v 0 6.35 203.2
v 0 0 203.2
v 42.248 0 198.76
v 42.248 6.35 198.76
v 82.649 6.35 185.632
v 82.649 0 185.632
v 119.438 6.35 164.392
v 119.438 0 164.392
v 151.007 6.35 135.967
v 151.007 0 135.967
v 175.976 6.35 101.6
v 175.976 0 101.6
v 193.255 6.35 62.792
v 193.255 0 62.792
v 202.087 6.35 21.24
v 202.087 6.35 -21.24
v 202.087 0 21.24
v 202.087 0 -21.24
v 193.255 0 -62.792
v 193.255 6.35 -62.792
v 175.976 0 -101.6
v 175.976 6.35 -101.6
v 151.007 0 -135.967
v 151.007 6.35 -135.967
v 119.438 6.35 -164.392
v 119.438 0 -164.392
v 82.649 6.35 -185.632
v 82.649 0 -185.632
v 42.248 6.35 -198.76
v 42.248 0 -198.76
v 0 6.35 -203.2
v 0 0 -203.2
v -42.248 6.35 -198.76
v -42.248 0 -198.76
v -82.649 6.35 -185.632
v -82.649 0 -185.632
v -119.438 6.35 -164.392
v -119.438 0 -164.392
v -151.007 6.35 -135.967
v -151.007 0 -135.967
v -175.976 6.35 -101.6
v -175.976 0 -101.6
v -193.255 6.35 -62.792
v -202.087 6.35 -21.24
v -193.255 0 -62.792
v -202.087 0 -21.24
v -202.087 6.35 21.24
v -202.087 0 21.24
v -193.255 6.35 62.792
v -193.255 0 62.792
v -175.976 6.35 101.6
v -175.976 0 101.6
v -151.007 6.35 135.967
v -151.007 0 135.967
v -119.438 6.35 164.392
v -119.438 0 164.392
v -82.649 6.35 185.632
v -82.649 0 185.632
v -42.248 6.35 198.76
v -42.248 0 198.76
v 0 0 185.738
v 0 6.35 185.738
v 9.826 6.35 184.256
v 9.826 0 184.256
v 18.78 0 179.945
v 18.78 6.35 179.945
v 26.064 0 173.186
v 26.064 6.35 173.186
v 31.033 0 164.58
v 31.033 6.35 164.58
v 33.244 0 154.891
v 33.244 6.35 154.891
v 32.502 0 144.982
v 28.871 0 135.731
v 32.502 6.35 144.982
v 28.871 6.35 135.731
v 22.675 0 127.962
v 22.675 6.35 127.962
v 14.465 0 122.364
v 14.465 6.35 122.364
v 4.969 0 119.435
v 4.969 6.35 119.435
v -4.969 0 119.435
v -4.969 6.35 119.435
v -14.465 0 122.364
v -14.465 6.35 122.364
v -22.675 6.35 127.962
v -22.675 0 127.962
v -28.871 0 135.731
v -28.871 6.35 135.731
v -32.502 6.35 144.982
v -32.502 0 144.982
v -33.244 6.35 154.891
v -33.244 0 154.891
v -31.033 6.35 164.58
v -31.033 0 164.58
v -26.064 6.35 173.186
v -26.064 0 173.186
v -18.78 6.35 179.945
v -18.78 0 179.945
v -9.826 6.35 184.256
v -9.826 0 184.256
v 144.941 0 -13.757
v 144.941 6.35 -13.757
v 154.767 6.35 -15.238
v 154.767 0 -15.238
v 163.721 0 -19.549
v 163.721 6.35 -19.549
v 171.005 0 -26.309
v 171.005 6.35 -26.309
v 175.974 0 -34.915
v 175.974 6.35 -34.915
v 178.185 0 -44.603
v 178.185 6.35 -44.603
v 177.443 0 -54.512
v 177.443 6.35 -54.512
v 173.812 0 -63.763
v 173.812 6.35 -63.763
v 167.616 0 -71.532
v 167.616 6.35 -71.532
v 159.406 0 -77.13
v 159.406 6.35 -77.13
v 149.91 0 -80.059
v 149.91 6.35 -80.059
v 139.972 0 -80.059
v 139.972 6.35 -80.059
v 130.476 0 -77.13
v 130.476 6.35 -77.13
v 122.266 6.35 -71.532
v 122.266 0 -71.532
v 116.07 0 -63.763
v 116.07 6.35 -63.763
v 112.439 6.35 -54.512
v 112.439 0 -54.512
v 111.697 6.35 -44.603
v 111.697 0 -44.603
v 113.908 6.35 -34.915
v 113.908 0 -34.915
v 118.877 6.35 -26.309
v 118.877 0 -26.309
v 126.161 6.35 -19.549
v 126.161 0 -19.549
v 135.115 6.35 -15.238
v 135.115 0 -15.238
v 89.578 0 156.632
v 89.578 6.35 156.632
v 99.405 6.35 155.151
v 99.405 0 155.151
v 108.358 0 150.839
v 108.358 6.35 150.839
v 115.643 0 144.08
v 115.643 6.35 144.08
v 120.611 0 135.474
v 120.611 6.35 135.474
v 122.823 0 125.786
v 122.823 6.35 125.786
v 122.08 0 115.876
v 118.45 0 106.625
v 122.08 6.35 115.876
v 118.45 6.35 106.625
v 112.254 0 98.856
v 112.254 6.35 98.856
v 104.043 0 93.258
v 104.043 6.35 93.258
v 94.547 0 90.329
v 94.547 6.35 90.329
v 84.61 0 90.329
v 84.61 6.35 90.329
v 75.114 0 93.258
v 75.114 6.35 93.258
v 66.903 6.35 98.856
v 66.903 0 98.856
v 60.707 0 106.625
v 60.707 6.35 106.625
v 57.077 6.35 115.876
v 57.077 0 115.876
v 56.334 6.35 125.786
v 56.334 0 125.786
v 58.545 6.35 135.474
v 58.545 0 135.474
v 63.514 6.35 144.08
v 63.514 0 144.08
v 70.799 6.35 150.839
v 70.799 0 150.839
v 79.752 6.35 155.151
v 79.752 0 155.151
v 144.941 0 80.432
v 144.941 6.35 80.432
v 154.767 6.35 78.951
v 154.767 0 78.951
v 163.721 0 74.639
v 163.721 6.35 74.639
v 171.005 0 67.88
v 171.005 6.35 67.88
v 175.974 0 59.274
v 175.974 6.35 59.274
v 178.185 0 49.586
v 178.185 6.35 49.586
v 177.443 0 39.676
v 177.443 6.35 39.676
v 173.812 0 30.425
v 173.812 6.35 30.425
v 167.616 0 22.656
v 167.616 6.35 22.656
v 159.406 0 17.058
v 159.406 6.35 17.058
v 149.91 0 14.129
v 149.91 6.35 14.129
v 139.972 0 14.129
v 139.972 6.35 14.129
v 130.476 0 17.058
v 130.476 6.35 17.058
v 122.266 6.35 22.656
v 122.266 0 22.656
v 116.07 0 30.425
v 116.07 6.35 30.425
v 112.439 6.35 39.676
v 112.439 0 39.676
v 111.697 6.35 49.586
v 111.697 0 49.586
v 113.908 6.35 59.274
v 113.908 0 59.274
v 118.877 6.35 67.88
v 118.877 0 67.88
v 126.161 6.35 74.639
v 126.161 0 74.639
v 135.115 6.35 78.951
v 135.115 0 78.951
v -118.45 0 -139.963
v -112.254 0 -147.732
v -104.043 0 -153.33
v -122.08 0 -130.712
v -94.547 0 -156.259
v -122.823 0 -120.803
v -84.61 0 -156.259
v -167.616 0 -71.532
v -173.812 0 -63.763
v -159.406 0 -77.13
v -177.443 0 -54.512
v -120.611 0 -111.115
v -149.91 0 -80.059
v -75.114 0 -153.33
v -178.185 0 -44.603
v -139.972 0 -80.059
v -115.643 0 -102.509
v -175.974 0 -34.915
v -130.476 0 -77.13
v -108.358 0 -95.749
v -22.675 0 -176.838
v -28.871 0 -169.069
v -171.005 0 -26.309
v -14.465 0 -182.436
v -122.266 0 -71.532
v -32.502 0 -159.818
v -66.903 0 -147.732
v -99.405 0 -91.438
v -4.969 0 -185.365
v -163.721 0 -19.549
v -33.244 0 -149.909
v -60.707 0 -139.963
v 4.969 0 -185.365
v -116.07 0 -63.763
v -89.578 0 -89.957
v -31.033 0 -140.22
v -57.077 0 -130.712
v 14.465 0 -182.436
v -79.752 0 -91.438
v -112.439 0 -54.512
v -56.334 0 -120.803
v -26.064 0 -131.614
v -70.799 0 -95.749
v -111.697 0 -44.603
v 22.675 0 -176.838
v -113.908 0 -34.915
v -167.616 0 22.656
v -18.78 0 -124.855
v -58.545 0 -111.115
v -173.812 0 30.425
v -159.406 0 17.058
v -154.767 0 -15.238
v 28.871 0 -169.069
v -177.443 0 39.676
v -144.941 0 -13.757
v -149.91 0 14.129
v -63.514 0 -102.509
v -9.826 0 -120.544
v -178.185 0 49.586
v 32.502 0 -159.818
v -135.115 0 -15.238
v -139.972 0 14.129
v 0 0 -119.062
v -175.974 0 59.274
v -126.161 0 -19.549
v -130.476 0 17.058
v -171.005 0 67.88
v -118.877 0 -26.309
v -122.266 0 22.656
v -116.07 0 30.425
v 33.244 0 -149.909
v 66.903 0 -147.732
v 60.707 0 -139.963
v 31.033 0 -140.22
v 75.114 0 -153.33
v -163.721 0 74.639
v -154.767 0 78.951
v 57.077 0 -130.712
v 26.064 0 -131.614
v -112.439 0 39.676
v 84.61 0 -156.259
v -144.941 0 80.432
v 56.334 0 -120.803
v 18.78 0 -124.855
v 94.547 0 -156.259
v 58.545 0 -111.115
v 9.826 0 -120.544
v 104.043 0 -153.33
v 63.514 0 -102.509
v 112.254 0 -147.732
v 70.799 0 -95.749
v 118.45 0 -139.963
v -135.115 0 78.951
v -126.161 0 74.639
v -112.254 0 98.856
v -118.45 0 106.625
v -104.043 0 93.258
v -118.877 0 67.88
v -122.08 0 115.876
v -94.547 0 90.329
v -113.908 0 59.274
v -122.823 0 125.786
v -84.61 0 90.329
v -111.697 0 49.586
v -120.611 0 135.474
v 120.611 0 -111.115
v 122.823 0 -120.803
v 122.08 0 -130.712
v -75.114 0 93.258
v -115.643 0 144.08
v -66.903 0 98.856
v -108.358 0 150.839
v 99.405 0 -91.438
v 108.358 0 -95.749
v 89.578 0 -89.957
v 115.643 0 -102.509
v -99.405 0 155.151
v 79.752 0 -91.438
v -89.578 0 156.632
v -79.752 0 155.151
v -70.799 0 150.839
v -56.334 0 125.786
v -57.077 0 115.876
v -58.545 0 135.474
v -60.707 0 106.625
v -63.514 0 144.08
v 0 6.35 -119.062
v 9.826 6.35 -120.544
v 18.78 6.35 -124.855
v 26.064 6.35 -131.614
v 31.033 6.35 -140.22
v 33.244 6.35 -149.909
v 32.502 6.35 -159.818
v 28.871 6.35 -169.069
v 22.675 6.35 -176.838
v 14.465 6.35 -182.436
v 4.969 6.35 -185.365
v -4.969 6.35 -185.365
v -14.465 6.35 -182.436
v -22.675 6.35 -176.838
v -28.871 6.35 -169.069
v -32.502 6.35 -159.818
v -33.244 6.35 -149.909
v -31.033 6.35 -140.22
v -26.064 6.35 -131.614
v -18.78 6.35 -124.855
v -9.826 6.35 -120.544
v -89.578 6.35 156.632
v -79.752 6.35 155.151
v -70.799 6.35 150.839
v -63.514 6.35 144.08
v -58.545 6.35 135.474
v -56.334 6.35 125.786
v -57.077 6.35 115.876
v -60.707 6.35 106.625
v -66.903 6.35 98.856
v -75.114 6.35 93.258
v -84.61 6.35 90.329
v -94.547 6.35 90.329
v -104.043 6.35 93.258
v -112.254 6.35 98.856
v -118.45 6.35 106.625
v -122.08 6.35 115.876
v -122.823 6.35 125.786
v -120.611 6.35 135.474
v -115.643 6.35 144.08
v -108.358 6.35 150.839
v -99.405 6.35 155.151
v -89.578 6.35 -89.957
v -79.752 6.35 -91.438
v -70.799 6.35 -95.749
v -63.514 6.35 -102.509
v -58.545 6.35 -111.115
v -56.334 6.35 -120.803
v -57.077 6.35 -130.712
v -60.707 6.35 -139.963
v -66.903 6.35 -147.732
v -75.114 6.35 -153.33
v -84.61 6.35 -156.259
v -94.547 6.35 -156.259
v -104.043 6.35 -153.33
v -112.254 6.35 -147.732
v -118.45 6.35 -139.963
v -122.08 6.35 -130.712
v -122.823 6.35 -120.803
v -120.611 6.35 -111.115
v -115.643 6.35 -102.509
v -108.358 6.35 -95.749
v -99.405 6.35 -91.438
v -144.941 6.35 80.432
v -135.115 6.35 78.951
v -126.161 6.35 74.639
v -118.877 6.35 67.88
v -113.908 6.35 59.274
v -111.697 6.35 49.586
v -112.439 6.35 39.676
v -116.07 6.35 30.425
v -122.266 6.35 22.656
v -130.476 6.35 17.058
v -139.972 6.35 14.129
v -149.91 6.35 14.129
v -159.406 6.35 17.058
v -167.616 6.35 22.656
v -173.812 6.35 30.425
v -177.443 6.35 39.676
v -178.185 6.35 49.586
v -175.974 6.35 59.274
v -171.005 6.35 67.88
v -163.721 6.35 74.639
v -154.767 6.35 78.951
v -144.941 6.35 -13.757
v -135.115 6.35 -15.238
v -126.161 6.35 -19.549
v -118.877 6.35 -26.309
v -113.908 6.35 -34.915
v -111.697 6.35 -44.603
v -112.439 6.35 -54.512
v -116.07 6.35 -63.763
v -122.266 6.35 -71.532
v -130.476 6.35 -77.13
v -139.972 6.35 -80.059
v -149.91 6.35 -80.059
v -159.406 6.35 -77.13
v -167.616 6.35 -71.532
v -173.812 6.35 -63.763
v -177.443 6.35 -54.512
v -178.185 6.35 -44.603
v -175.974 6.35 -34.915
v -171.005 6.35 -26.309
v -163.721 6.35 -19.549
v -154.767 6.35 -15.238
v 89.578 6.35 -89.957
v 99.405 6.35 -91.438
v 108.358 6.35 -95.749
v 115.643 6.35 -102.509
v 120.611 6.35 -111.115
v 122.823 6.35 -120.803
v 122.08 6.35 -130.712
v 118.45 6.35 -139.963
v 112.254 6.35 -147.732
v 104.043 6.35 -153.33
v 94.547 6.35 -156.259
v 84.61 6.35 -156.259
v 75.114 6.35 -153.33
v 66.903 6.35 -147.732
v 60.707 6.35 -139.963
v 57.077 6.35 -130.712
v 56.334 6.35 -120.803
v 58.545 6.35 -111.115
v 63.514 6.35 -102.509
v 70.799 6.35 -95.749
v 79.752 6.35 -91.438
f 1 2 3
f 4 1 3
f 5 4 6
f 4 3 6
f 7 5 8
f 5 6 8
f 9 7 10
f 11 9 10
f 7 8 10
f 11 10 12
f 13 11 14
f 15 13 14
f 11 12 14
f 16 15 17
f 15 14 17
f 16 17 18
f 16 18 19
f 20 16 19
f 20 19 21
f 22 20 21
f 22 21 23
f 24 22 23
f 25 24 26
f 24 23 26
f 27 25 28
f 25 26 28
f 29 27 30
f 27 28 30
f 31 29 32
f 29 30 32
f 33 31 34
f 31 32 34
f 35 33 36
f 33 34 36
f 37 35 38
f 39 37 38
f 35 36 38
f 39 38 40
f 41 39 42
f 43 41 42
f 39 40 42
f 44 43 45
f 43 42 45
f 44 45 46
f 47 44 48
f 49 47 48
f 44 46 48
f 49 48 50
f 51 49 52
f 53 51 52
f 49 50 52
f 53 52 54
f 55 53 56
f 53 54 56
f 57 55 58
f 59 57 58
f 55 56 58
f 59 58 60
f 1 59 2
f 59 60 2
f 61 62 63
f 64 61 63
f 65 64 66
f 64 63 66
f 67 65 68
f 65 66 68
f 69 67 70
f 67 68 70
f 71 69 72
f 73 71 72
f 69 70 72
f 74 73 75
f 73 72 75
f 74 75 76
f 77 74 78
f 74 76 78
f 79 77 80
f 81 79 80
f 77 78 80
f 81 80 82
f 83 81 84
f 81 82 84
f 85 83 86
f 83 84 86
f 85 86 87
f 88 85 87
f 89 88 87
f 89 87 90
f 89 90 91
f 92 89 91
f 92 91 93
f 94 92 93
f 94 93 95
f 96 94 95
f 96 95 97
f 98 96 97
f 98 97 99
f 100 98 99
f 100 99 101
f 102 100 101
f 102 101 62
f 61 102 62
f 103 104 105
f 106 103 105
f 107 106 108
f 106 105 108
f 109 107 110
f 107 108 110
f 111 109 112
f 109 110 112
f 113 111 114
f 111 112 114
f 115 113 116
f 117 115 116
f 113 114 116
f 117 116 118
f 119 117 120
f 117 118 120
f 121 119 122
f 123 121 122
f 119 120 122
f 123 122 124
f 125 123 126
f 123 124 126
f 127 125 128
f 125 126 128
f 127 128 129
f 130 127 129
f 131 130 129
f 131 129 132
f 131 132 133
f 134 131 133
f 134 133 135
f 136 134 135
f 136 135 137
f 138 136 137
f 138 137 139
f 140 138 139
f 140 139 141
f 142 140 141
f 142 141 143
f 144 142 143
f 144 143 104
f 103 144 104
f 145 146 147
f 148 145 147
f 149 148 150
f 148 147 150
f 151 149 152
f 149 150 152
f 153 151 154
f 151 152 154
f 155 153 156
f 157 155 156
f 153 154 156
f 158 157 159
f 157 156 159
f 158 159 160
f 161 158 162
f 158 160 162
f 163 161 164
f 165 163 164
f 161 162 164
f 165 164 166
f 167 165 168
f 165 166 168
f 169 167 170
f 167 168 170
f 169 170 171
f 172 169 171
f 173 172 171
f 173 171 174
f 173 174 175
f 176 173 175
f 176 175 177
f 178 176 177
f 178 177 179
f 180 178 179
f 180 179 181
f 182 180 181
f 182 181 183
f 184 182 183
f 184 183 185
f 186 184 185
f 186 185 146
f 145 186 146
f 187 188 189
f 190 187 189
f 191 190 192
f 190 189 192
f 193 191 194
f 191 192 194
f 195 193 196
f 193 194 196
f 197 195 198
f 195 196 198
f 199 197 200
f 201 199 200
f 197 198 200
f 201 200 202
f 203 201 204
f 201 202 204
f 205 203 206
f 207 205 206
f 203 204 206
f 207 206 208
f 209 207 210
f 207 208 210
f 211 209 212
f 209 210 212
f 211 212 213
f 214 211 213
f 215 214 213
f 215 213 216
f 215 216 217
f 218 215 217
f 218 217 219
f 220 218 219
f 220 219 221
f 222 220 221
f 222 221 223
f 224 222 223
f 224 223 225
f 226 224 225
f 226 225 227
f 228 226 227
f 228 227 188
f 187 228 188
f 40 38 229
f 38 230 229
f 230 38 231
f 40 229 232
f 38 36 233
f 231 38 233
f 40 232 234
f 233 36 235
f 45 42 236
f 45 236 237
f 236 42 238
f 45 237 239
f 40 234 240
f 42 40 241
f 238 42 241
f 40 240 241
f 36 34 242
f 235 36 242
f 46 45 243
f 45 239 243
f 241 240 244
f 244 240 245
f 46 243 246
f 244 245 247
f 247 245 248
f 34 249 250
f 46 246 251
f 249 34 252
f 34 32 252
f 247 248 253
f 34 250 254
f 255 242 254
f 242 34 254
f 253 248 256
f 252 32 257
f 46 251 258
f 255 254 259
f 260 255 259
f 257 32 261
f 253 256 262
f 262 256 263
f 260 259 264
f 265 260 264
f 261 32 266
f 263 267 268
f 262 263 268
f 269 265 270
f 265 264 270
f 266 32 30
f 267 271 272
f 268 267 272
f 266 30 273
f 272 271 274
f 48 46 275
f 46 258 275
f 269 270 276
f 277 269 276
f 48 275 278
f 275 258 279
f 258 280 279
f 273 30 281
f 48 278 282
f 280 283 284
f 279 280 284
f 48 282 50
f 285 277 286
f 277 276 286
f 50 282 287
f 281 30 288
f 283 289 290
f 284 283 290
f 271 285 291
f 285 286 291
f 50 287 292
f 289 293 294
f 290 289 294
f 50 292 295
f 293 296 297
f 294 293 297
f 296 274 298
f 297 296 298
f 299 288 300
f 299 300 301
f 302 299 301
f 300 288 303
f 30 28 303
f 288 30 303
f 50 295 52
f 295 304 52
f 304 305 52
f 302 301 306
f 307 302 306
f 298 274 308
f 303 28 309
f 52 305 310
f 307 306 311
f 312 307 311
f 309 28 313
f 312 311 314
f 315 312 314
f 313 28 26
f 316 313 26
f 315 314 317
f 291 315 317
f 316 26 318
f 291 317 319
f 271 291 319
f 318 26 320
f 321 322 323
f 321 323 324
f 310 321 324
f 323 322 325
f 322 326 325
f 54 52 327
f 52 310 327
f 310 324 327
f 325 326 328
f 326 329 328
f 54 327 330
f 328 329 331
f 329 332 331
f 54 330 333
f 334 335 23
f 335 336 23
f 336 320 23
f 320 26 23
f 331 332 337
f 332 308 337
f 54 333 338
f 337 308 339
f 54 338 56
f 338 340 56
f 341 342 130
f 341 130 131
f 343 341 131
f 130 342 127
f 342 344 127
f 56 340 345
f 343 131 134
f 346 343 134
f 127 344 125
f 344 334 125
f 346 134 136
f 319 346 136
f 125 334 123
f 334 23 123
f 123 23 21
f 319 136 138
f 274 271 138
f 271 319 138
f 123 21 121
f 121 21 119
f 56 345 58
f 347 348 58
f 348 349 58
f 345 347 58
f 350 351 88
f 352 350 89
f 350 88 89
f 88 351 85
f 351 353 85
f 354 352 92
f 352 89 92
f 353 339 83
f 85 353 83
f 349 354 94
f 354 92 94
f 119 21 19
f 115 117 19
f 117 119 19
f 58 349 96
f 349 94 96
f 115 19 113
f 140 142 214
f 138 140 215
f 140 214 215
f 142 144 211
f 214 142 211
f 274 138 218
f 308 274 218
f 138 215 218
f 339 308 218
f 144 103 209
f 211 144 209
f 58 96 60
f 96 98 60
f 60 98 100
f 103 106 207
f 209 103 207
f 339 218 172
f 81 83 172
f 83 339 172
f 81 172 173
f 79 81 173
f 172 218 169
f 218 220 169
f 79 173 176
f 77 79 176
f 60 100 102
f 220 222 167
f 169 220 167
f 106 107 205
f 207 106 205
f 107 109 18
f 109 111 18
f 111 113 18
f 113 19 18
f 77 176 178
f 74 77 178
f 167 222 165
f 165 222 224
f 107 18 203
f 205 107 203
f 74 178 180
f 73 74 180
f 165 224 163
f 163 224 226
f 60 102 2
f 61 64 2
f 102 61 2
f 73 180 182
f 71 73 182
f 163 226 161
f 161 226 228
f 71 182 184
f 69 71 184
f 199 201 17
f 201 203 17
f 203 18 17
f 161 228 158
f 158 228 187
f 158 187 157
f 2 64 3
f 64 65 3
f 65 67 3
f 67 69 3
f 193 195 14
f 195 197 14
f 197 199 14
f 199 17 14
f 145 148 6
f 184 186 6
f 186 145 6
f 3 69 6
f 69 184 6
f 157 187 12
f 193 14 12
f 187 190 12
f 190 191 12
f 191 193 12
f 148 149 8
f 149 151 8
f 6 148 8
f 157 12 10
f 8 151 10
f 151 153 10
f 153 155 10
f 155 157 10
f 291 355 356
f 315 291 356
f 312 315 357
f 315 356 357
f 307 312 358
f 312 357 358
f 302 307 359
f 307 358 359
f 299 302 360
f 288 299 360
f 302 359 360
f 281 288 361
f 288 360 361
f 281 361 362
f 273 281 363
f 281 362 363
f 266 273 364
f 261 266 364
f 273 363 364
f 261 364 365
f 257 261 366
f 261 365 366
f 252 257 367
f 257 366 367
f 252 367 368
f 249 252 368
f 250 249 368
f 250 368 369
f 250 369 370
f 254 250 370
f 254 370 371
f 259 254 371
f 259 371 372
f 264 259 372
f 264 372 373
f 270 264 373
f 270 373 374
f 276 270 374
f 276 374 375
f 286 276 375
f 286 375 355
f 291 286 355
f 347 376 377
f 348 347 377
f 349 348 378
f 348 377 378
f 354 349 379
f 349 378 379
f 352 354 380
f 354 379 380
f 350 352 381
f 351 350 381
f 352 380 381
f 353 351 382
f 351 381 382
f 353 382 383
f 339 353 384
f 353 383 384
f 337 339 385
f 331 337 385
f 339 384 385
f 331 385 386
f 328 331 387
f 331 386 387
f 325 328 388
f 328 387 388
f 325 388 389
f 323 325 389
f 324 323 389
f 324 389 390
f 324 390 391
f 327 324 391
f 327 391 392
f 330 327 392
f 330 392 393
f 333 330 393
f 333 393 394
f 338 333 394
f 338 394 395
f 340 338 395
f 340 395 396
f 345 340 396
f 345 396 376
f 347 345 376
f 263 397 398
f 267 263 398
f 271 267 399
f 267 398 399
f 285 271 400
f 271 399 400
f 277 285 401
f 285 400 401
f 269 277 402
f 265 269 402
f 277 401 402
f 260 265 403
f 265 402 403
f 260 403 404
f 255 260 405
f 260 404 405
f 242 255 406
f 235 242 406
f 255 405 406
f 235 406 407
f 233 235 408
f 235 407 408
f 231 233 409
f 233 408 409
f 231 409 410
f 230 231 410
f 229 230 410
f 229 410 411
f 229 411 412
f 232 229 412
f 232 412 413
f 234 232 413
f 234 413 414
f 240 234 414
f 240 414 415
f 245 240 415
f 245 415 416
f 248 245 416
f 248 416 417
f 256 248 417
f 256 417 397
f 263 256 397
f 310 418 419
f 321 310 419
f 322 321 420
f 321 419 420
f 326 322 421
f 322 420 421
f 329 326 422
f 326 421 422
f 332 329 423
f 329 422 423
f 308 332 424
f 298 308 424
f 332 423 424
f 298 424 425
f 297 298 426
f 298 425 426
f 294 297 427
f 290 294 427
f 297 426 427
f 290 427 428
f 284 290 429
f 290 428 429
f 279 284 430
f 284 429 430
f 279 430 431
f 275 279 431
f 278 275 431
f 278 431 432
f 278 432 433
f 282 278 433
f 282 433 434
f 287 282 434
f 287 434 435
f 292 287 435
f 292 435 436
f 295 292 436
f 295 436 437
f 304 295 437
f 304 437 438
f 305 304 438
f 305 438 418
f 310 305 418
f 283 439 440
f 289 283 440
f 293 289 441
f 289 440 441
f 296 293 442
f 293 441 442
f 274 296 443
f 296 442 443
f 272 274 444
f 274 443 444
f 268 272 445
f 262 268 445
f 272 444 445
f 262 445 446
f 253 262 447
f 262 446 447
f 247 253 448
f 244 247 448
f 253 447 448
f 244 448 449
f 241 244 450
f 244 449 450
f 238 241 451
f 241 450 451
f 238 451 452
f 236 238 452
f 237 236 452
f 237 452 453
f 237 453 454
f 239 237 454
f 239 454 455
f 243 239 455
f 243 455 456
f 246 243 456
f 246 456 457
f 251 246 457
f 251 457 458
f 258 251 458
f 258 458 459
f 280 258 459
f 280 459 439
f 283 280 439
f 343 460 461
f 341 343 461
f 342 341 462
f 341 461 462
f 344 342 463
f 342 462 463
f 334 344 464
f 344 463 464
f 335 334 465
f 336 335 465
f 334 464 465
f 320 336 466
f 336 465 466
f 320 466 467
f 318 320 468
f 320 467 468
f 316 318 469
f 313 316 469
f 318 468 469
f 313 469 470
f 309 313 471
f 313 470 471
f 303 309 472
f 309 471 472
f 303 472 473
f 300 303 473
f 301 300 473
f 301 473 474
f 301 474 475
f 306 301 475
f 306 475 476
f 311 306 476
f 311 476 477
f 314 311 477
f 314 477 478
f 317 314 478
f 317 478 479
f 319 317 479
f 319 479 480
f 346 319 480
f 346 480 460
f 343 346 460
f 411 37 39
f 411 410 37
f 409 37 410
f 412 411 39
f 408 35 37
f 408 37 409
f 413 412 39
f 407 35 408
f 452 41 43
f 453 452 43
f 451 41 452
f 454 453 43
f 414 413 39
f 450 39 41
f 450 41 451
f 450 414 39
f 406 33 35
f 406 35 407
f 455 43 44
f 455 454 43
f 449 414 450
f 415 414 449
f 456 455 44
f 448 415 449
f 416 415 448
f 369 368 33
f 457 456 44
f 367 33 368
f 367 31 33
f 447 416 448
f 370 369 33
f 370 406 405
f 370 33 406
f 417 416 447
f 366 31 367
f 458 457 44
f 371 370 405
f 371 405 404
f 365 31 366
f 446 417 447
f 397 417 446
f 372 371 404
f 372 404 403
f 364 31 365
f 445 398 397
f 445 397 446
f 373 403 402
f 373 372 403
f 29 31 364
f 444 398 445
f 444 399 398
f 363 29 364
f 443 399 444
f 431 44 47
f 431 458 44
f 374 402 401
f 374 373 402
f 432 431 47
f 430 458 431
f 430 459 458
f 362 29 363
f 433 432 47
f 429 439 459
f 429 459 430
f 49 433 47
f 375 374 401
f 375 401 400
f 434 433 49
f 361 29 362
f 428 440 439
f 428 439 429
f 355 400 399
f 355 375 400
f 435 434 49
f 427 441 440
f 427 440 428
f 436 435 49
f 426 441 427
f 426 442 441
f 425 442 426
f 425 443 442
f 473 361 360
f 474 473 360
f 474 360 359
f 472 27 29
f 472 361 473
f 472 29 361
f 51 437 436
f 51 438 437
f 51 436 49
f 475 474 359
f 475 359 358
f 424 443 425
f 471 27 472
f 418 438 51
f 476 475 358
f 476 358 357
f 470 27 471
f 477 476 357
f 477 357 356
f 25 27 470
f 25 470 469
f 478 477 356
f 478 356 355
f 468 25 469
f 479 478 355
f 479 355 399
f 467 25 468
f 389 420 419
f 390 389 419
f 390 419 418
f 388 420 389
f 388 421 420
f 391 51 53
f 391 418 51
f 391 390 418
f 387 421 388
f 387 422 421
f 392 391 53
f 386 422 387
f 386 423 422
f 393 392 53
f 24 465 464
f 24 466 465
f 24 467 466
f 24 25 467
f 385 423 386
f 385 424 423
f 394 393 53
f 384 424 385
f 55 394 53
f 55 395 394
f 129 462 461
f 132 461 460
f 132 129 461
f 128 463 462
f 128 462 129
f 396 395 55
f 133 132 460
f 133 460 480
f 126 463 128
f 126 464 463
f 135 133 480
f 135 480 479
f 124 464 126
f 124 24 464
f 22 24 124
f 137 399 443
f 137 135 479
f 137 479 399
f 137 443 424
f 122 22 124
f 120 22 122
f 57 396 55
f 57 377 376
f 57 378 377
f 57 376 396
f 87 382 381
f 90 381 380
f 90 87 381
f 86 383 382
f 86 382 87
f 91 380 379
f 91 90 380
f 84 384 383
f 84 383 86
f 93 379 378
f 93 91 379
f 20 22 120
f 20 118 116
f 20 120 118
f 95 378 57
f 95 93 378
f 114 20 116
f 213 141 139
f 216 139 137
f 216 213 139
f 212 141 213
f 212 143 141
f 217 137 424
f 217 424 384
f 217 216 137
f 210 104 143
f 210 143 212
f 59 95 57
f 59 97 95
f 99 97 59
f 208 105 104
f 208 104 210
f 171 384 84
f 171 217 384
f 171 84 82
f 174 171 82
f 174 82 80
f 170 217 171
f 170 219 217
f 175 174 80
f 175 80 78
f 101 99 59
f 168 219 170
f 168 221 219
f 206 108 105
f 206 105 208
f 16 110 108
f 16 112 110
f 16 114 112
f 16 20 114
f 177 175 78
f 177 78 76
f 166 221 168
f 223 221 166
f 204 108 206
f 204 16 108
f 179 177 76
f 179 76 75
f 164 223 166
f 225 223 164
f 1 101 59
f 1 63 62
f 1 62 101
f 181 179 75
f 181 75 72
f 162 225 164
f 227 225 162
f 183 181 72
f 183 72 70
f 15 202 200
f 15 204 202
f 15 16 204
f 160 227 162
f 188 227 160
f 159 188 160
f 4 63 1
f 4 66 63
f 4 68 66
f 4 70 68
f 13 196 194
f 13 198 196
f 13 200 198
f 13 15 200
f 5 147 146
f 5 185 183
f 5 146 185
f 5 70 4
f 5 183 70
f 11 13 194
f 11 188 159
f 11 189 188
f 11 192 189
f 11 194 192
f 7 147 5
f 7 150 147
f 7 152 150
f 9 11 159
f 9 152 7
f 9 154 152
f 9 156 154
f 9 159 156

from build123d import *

# Parameters (mm, degrees)
SKETCH1_R           = 203.2
BOSS_EXTRUDE1_DEPTH = 6.35
SKETCH2_R           = 33.3375
CUT_EXTRUDE1_DEPTH  = 288.438345563


with BuildPart() as part:
    # Sketch1 → Boss-Extrude1 (new body)
    with BuildSketch(Plane(origin=(0, 0, 0), x_dir=(1, 0, 0), z_dir=(0, 1, 0))):
        with Locations(Location((0, 0, 0), (0, 0, 270))):
            Circle(SKETCH1_R)
    extrude(amount=BOSS_EXTRUDE1_DEPTH)

    # Sketch2 → Cut-Extrude1 (cut, through all)
    with BuildSketch(Plane(origin=(0, 6.35, 0), x_dir=(1, 0, 0), z_dir=(0, 1, 0))):
        with Locations(Location((0, 152.4, 0), (0, 0, 270))):
            Circle(SKETCH2_R)
        with Locations(Location((89.578472449, 123.294189943, 0), (0, 0, 270))):
            Circle(SKETCH2_R)
        with Locations(Location((144.941013083, 47.094189943, 0), (0, 0, 270))):
            Circle(SKETCH2_R)
        with Locations(Location((144.941013083, -47.094189943, 0), (0, 0, 270))):
            Circle(SKETCH2_R)
        with Locations(Location((89.578472449, -123.294189943, 0), (0, 0, 270))):
            Circle(SKETCH2_R)
        with Locations(Location((0, -152.4, 0), (0, 0, 270))):
            Circle(SKETCH2_R)
        with Locations(Location((-89.578472449, -123.294189943, 0), (0, 0, 270))):
            Circle(SKETCH2_R)
        with Locations(Location((-144.941013083, -47.094189943, 0), (0, 0, 270))):
            Circle(SKETCH2_R)
        with Locations(Location((-144.941013083, 47.094189943, 0), (0, 0, 270))):
            Circle(SKETCH2_R)
        with Locations(Location((-89.578472449, 123.294189943, 0), (0, 0, 270))):
            Circle(SKETCH2_R)
    extrude(amount=-CUT_EXTRUDE1_DEPTH, mode=Mode.SUBTRACT)


solid = part.part
